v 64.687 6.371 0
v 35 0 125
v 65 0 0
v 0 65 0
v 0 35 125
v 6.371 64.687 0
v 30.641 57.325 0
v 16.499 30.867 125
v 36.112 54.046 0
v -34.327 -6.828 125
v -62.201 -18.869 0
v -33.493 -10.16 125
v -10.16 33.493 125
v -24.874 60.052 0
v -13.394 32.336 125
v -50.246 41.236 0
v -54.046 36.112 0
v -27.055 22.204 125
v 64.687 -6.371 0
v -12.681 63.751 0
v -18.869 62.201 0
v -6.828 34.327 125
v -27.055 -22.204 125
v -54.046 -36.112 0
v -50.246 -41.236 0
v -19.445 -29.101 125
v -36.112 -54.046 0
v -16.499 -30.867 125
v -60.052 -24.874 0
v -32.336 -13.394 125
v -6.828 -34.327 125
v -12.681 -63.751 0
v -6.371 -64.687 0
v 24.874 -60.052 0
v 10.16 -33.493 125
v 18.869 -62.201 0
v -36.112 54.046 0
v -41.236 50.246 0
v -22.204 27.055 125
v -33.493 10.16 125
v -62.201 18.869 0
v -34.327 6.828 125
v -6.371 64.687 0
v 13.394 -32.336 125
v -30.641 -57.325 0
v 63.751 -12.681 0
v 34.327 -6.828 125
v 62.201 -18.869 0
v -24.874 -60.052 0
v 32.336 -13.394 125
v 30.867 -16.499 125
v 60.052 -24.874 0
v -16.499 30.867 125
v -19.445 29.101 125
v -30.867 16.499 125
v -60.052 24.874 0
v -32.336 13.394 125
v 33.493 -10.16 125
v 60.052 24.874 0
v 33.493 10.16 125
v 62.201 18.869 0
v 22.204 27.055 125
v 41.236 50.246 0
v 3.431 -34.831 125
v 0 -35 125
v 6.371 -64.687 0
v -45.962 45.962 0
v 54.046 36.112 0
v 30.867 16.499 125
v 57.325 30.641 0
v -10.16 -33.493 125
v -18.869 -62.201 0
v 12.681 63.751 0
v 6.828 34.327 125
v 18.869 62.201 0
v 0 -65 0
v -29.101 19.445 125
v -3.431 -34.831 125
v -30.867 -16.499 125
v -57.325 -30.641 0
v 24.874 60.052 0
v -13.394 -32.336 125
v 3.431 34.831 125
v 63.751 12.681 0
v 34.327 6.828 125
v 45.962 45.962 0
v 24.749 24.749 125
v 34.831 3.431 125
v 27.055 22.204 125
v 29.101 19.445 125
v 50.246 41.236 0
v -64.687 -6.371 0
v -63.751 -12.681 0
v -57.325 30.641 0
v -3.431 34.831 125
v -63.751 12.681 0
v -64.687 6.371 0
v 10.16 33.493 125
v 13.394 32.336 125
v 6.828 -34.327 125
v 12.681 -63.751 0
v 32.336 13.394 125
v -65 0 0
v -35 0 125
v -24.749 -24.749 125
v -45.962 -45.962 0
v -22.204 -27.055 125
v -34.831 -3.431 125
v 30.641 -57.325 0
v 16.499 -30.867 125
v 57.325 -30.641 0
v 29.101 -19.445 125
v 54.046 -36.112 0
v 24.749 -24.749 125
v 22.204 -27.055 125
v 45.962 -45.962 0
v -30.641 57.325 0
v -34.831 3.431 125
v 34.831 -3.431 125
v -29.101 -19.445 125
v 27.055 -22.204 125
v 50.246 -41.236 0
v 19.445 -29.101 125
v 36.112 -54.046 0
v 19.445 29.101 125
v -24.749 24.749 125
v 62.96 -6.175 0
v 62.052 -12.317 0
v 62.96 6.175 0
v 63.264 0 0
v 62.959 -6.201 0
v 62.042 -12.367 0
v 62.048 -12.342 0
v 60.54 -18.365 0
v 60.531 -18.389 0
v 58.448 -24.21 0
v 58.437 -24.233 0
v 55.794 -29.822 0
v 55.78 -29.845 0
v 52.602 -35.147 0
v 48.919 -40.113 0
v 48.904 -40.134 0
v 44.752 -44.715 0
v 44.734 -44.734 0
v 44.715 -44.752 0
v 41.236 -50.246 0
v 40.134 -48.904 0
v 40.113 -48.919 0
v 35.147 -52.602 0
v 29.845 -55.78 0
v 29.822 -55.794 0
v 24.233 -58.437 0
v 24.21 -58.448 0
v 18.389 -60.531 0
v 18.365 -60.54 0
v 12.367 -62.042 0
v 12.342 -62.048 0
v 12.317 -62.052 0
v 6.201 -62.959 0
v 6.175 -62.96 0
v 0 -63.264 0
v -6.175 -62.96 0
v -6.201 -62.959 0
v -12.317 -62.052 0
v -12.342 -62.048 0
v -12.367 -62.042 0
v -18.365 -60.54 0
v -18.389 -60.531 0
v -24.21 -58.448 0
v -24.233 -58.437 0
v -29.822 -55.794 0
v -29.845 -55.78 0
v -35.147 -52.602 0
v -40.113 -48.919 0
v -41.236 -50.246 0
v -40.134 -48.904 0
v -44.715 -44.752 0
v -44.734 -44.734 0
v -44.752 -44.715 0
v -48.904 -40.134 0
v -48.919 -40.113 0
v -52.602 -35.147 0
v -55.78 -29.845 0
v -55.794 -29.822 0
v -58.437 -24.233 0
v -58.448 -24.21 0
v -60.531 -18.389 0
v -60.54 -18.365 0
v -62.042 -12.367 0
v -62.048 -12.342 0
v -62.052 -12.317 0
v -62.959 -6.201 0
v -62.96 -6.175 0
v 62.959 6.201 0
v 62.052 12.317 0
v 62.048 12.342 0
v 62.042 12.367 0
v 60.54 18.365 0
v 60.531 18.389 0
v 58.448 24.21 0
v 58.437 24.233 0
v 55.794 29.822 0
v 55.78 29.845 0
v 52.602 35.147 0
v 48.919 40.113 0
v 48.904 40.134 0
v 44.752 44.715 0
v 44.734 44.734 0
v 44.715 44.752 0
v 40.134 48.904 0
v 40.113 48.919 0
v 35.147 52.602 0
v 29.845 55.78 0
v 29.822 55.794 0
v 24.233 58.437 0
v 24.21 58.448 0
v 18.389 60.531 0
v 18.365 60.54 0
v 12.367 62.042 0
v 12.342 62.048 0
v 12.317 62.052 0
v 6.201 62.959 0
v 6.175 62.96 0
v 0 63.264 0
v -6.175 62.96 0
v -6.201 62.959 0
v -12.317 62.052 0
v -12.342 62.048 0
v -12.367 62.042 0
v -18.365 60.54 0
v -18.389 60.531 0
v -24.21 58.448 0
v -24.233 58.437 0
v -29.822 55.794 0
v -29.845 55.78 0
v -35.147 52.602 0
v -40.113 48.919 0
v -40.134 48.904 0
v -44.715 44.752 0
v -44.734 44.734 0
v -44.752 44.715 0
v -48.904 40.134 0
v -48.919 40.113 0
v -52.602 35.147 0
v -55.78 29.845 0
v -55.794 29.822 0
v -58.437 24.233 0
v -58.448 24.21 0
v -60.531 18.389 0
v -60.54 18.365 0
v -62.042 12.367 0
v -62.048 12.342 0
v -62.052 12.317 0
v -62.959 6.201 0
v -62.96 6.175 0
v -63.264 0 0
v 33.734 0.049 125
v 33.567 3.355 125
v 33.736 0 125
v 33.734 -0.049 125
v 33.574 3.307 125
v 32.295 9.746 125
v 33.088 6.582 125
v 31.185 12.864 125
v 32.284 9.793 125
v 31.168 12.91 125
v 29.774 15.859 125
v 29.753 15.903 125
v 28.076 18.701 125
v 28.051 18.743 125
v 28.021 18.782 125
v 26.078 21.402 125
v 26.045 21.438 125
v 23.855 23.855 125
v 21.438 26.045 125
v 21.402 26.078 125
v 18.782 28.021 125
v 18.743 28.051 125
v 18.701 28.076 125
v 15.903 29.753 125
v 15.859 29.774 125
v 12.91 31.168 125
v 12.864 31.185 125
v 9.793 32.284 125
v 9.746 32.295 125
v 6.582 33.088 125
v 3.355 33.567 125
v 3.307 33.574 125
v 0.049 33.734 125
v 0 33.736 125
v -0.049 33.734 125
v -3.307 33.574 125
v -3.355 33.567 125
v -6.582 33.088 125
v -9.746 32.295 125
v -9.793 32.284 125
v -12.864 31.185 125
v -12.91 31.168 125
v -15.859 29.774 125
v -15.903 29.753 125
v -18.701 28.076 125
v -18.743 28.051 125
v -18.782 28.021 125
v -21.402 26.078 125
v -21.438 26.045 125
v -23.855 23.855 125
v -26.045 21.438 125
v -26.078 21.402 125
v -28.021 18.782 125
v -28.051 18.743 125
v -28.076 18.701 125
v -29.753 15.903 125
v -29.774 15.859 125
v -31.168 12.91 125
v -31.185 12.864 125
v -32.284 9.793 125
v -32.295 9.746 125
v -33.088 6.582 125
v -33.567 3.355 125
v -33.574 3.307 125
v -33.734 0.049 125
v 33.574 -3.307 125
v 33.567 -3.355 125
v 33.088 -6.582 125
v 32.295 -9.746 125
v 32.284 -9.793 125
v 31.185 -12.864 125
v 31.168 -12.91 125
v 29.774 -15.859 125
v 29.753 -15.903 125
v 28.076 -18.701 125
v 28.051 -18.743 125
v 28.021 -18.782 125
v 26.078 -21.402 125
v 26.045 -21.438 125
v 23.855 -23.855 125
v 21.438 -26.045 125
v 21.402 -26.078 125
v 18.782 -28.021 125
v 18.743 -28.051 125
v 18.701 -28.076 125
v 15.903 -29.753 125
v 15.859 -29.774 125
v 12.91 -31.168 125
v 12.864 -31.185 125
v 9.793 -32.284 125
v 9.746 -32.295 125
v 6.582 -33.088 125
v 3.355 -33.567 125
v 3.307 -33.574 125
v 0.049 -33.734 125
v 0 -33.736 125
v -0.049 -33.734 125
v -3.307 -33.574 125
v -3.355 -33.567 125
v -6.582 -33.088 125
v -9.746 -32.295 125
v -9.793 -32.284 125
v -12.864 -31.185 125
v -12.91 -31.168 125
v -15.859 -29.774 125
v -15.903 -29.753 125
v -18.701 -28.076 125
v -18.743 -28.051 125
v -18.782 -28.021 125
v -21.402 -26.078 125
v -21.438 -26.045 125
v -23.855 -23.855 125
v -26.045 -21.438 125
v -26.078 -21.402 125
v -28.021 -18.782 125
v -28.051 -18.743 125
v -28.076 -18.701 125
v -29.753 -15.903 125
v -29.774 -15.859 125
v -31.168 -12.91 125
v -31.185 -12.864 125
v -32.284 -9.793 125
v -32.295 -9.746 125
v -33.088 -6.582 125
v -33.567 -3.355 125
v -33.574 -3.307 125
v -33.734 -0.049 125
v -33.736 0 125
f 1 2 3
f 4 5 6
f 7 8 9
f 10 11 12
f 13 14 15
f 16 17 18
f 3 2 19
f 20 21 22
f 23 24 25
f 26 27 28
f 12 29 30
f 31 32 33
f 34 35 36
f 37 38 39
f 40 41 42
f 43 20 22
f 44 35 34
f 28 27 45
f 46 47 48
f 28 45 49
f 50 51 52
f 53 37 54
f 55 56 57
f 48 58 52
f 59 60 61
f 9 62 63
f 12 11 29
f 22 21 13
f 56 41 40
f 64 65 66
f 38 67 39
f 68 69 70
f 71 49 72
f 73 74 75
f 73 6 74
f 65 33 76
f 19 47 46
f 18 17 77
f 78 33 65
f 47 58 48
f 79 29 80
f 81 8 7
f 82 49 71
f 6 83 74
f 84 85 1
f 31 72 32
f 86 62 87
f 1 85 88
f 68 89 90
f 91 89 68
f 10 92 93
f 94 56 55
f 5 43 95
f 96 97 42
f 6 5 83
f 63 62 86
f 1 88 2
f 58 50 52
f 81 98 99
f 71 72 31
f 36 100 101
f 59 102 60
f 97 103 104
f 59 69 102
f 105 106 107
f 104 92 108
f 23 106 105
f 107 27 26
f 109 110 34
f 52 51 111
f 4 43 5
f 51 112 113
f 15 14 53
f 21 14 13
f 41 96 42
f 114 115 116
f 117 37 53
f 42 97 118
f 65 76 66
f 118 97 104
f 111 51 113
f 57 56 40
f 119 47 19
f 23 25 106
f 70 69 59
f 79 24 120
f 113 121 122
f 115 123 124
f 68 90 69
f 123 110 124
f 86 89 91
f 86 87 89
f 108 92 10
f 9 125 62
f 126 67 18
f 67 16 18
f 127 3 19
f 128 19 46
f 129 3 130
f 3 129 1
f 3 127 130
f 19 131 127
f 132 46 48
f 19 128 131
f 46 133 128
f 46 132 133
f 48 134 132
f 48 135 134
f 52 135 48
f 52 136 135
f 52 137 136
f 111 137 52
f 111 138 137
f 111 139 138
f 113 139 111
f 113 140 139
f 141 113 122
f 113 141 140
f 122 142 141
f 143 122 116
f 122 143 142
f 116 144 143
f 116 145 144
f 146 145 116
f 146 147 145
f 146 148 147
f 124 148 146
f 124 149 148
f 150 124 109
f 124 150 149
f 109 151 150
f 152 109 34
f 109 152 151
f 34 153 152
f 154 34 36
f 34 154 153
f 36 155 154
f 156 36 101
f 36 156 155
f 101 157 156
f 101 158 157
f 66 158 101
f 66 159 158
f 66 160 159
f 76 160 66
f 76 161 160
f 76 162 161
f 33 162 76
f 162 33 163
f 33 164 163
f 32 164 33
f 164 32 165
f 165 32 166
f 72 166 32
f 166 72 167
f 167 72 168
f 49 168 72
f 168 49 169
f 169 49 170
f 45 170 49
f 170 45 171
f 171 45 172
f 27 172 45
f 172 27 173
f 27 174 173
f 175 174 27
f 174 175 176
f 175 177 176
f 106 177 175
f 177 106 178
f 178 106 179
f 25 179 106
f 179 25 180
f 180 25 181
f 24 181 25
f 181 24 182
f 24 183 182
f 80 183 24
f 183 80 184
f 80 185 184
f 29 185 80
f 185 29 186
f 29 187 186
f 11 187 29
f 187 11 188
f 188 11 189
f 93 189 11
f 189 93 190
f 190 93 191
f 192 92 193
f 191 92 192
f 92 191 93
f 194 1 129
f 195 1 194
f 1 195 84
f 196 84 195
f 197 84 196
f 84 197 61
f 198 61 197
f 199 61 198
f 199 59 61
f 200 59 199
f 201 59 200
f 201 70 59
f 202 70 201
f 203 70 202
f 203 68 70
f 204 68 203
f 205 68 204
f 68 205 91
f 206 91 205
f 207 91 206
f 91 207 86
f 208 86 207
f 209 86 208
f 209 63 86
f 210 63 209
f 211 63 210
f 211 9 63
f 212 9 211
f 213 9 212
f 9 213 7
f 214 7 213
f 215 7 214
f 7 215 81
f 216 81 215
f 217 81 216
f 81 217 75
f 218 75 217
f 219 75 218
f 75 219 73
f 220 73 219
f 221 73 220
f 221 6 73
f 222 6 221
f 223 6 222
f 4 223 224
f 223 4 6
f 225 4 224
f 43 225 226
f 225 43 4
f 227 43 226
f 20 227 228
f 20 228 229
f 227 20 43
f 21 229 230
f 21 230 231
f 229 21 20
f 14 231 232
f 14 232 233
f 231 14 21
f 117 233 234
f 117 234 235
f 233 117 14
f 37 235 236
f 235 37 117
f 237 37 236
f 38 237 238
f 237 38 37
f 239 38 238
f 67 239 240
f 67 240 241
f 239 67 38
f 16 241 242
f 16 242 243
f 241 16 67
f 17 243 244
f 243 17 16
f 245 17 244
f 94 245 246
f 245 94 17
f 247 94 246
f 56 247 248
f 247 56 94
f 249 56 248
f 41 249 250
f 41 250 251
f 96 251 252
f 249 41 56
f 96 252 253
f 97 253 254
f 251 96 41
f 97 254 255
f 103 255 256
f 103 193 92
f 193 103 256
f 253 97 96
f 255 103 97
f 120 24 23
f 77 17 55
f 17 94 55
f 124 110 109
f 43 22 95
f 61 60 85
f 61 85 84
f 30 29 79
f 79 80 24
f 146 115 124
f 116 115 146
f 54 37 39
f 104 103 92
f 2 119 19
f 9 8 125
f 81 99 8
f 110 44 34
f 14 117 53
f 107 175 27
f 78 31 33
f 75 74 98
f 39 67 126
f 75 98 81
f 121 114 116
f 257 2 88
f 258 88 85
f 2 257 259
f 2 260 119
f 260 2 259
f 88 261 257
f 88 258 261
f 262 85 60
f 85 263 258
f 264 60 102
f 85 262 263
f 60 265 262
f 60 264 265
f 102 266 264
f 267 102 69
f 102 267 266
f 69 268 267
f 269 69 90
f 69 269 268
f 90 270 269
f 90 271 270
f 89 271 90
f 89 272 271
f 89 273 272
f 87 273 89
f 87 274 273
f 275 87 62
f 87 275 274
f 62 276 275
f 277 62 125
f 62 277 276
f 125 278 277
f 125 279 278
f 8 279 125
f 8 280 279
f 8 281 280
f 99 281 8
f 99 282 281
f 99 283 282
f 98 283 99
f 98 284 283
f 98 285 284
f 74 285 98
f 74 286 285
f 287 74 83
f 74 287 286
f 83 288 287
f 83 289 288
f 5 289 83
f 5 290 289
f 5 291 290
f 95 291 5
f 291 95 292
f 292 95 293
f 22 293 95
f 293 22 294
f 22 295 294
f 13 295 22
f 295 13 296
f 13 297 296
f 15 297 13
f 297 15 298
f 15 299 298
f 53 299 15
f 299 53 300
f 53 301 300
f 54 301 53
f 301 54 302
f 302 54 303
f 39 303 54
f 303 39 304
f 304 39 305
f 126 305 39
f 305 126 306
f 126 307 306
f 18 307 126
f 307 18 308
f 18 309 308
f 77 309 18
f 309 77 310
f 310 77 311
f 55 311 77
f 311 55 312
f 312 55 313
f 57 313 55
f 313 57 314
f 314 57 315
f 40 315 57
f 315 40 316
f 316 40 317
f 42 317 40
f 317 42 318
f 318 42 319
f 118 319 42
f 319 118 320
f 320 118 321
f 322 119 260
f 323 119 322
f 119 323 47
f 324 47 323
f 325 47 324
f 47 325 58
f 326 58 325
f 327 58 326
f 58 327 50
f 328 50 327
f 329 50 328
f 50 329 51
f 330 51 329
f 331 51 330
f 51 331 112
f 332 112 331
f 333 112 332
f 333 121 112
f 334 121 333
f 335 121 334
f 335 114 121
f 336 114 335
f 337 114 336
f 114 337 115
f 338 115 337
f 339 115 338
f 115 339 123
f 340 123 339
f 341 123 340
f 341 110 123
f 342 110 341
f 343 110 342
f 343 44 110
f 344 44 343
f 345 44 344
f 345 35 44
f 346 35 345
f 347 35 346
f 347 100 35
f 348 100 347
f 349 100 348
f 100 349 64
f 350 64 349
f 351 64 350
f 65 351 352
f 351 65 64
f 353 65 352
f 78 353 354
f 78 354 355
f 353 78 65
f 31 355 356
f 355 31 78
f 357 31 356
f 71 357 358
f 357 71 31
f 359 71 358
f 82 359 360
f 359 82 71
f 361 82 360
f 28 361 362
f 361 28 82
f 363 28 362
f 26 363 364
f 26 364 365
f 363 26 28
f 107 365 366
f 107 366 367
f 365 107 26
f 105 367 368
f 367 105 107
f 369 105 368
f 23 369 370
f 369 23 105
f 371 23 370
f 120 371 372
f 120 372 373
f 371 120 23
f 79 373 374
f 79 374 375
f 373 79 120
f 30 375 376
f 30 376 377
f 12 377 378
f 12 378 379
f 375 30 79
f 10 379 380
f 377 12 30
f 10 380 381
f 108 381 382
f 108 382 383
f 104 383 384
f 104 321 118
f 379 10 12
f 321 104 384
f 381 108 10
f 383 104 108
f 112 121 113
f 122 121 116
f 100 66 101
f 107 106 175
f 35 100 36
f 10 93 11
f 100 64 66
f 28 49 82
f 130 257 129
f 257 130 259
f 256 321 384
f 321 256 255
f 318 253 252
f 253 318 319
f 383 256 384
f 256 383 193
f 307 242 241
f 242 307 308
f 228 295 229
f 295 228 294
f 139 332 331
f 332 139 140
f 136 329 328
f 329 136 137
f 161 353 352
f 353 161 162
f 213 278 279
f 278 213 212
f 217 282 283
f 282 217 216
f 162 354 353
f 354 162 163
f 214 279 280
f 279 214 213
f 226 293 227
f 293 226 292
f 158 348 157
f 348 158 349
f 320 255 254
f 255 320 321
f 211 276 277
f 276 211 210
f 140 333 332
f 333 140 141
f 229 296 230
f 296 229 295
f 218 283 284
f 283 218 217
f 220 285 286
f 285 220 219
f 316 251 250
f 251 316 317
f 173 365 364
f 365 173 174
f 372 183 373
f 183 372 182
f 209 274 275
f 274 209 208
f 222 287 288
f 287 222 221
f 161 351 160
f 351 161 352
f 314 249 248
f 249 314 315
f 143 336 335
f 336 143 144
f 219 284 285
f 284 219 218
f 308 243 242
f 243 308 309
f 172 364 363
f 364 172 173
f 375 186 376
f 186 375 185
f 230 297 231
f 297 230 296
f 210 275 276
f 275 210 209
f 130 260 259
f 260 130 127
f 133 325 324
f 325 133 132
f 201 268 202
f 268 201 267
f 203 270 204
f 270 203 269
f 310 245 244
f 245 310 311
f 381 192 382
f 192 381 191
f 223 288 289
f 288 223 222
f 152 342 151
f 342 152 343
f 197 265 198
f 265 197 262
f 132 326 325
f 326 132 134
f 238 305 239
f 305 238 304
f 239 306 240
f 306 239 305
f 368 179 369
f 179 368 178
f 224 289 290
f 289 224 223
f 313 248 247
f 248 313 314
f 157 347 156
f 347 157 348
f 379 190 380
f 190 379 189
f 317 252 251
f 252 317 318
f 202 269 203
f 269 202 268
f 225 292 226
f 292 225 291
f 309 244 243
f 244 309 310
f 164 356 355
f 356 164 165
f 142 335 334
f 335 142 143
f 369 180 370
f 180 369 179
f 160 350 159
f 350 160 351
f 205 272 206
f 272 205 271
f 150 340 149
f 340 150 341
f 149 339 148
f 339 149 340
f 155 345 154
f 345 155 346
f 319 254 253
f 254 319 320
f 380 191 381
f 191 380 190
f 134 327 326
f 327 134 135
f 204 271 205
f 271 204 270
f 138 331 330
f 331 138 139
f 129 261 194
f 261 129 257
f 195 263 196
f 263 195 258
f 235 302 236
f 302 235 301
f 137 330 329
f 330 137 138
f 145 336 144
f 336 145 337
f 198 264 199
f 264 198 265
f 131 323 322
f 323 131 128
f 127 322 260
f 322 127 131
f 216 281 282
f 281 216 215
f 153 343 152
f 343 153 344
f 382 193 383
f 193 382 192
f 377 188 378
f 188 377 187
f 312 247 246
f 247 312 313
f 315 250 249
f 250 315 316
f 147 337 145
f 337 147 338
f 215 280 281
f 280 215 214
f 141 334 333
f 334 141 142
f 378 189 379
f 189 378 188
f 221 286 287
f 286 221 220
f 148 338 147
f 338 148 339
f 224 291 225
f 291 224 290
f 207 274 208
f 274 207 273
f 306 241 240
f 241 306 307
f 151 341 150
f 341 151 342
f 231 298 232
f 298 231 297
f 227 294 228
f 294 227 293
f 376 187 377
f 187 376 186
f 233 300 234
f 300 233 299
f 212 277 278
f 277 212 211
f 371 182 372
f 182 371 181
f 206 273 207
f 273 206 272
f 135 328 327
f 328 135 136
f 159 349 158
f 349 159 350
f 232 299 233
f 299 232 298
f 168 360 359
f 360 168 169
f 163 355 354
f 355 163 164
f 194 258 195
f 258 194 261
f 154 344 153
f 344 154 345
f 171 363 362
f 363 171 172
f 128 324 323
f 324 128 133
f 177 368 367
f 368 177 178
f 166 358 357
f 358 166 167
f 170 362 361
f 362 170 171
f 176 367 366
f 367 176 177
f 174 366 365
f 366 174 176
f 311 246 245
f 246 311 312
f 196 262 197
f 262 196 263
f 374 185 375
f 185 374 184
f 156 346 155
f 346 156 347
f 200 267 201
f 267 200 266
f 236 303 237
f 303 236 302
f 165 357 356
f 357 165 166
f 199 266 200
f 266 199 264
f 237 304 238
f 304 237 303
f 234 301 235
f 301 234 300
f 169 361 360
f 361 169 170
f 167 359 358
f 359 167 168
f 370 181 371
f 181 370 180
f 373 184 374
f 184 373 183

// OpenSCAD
bandHeight = 125;
bandRadiusTop = 35;
bandRadiusBottom = 65;
bandThickness = 3;

difference() {
    cylinder(r1=bandRadiusBottom,r2=bandRadiusTop,h=bandHeight,$fn=64);
    translate([0,0,-1]) cylinder(r1=bandRadiusBottom-bandThickness/2,r2=bandRadiusTop-bandThickness/2,h=bandHeight+2,$fn=64);
}
